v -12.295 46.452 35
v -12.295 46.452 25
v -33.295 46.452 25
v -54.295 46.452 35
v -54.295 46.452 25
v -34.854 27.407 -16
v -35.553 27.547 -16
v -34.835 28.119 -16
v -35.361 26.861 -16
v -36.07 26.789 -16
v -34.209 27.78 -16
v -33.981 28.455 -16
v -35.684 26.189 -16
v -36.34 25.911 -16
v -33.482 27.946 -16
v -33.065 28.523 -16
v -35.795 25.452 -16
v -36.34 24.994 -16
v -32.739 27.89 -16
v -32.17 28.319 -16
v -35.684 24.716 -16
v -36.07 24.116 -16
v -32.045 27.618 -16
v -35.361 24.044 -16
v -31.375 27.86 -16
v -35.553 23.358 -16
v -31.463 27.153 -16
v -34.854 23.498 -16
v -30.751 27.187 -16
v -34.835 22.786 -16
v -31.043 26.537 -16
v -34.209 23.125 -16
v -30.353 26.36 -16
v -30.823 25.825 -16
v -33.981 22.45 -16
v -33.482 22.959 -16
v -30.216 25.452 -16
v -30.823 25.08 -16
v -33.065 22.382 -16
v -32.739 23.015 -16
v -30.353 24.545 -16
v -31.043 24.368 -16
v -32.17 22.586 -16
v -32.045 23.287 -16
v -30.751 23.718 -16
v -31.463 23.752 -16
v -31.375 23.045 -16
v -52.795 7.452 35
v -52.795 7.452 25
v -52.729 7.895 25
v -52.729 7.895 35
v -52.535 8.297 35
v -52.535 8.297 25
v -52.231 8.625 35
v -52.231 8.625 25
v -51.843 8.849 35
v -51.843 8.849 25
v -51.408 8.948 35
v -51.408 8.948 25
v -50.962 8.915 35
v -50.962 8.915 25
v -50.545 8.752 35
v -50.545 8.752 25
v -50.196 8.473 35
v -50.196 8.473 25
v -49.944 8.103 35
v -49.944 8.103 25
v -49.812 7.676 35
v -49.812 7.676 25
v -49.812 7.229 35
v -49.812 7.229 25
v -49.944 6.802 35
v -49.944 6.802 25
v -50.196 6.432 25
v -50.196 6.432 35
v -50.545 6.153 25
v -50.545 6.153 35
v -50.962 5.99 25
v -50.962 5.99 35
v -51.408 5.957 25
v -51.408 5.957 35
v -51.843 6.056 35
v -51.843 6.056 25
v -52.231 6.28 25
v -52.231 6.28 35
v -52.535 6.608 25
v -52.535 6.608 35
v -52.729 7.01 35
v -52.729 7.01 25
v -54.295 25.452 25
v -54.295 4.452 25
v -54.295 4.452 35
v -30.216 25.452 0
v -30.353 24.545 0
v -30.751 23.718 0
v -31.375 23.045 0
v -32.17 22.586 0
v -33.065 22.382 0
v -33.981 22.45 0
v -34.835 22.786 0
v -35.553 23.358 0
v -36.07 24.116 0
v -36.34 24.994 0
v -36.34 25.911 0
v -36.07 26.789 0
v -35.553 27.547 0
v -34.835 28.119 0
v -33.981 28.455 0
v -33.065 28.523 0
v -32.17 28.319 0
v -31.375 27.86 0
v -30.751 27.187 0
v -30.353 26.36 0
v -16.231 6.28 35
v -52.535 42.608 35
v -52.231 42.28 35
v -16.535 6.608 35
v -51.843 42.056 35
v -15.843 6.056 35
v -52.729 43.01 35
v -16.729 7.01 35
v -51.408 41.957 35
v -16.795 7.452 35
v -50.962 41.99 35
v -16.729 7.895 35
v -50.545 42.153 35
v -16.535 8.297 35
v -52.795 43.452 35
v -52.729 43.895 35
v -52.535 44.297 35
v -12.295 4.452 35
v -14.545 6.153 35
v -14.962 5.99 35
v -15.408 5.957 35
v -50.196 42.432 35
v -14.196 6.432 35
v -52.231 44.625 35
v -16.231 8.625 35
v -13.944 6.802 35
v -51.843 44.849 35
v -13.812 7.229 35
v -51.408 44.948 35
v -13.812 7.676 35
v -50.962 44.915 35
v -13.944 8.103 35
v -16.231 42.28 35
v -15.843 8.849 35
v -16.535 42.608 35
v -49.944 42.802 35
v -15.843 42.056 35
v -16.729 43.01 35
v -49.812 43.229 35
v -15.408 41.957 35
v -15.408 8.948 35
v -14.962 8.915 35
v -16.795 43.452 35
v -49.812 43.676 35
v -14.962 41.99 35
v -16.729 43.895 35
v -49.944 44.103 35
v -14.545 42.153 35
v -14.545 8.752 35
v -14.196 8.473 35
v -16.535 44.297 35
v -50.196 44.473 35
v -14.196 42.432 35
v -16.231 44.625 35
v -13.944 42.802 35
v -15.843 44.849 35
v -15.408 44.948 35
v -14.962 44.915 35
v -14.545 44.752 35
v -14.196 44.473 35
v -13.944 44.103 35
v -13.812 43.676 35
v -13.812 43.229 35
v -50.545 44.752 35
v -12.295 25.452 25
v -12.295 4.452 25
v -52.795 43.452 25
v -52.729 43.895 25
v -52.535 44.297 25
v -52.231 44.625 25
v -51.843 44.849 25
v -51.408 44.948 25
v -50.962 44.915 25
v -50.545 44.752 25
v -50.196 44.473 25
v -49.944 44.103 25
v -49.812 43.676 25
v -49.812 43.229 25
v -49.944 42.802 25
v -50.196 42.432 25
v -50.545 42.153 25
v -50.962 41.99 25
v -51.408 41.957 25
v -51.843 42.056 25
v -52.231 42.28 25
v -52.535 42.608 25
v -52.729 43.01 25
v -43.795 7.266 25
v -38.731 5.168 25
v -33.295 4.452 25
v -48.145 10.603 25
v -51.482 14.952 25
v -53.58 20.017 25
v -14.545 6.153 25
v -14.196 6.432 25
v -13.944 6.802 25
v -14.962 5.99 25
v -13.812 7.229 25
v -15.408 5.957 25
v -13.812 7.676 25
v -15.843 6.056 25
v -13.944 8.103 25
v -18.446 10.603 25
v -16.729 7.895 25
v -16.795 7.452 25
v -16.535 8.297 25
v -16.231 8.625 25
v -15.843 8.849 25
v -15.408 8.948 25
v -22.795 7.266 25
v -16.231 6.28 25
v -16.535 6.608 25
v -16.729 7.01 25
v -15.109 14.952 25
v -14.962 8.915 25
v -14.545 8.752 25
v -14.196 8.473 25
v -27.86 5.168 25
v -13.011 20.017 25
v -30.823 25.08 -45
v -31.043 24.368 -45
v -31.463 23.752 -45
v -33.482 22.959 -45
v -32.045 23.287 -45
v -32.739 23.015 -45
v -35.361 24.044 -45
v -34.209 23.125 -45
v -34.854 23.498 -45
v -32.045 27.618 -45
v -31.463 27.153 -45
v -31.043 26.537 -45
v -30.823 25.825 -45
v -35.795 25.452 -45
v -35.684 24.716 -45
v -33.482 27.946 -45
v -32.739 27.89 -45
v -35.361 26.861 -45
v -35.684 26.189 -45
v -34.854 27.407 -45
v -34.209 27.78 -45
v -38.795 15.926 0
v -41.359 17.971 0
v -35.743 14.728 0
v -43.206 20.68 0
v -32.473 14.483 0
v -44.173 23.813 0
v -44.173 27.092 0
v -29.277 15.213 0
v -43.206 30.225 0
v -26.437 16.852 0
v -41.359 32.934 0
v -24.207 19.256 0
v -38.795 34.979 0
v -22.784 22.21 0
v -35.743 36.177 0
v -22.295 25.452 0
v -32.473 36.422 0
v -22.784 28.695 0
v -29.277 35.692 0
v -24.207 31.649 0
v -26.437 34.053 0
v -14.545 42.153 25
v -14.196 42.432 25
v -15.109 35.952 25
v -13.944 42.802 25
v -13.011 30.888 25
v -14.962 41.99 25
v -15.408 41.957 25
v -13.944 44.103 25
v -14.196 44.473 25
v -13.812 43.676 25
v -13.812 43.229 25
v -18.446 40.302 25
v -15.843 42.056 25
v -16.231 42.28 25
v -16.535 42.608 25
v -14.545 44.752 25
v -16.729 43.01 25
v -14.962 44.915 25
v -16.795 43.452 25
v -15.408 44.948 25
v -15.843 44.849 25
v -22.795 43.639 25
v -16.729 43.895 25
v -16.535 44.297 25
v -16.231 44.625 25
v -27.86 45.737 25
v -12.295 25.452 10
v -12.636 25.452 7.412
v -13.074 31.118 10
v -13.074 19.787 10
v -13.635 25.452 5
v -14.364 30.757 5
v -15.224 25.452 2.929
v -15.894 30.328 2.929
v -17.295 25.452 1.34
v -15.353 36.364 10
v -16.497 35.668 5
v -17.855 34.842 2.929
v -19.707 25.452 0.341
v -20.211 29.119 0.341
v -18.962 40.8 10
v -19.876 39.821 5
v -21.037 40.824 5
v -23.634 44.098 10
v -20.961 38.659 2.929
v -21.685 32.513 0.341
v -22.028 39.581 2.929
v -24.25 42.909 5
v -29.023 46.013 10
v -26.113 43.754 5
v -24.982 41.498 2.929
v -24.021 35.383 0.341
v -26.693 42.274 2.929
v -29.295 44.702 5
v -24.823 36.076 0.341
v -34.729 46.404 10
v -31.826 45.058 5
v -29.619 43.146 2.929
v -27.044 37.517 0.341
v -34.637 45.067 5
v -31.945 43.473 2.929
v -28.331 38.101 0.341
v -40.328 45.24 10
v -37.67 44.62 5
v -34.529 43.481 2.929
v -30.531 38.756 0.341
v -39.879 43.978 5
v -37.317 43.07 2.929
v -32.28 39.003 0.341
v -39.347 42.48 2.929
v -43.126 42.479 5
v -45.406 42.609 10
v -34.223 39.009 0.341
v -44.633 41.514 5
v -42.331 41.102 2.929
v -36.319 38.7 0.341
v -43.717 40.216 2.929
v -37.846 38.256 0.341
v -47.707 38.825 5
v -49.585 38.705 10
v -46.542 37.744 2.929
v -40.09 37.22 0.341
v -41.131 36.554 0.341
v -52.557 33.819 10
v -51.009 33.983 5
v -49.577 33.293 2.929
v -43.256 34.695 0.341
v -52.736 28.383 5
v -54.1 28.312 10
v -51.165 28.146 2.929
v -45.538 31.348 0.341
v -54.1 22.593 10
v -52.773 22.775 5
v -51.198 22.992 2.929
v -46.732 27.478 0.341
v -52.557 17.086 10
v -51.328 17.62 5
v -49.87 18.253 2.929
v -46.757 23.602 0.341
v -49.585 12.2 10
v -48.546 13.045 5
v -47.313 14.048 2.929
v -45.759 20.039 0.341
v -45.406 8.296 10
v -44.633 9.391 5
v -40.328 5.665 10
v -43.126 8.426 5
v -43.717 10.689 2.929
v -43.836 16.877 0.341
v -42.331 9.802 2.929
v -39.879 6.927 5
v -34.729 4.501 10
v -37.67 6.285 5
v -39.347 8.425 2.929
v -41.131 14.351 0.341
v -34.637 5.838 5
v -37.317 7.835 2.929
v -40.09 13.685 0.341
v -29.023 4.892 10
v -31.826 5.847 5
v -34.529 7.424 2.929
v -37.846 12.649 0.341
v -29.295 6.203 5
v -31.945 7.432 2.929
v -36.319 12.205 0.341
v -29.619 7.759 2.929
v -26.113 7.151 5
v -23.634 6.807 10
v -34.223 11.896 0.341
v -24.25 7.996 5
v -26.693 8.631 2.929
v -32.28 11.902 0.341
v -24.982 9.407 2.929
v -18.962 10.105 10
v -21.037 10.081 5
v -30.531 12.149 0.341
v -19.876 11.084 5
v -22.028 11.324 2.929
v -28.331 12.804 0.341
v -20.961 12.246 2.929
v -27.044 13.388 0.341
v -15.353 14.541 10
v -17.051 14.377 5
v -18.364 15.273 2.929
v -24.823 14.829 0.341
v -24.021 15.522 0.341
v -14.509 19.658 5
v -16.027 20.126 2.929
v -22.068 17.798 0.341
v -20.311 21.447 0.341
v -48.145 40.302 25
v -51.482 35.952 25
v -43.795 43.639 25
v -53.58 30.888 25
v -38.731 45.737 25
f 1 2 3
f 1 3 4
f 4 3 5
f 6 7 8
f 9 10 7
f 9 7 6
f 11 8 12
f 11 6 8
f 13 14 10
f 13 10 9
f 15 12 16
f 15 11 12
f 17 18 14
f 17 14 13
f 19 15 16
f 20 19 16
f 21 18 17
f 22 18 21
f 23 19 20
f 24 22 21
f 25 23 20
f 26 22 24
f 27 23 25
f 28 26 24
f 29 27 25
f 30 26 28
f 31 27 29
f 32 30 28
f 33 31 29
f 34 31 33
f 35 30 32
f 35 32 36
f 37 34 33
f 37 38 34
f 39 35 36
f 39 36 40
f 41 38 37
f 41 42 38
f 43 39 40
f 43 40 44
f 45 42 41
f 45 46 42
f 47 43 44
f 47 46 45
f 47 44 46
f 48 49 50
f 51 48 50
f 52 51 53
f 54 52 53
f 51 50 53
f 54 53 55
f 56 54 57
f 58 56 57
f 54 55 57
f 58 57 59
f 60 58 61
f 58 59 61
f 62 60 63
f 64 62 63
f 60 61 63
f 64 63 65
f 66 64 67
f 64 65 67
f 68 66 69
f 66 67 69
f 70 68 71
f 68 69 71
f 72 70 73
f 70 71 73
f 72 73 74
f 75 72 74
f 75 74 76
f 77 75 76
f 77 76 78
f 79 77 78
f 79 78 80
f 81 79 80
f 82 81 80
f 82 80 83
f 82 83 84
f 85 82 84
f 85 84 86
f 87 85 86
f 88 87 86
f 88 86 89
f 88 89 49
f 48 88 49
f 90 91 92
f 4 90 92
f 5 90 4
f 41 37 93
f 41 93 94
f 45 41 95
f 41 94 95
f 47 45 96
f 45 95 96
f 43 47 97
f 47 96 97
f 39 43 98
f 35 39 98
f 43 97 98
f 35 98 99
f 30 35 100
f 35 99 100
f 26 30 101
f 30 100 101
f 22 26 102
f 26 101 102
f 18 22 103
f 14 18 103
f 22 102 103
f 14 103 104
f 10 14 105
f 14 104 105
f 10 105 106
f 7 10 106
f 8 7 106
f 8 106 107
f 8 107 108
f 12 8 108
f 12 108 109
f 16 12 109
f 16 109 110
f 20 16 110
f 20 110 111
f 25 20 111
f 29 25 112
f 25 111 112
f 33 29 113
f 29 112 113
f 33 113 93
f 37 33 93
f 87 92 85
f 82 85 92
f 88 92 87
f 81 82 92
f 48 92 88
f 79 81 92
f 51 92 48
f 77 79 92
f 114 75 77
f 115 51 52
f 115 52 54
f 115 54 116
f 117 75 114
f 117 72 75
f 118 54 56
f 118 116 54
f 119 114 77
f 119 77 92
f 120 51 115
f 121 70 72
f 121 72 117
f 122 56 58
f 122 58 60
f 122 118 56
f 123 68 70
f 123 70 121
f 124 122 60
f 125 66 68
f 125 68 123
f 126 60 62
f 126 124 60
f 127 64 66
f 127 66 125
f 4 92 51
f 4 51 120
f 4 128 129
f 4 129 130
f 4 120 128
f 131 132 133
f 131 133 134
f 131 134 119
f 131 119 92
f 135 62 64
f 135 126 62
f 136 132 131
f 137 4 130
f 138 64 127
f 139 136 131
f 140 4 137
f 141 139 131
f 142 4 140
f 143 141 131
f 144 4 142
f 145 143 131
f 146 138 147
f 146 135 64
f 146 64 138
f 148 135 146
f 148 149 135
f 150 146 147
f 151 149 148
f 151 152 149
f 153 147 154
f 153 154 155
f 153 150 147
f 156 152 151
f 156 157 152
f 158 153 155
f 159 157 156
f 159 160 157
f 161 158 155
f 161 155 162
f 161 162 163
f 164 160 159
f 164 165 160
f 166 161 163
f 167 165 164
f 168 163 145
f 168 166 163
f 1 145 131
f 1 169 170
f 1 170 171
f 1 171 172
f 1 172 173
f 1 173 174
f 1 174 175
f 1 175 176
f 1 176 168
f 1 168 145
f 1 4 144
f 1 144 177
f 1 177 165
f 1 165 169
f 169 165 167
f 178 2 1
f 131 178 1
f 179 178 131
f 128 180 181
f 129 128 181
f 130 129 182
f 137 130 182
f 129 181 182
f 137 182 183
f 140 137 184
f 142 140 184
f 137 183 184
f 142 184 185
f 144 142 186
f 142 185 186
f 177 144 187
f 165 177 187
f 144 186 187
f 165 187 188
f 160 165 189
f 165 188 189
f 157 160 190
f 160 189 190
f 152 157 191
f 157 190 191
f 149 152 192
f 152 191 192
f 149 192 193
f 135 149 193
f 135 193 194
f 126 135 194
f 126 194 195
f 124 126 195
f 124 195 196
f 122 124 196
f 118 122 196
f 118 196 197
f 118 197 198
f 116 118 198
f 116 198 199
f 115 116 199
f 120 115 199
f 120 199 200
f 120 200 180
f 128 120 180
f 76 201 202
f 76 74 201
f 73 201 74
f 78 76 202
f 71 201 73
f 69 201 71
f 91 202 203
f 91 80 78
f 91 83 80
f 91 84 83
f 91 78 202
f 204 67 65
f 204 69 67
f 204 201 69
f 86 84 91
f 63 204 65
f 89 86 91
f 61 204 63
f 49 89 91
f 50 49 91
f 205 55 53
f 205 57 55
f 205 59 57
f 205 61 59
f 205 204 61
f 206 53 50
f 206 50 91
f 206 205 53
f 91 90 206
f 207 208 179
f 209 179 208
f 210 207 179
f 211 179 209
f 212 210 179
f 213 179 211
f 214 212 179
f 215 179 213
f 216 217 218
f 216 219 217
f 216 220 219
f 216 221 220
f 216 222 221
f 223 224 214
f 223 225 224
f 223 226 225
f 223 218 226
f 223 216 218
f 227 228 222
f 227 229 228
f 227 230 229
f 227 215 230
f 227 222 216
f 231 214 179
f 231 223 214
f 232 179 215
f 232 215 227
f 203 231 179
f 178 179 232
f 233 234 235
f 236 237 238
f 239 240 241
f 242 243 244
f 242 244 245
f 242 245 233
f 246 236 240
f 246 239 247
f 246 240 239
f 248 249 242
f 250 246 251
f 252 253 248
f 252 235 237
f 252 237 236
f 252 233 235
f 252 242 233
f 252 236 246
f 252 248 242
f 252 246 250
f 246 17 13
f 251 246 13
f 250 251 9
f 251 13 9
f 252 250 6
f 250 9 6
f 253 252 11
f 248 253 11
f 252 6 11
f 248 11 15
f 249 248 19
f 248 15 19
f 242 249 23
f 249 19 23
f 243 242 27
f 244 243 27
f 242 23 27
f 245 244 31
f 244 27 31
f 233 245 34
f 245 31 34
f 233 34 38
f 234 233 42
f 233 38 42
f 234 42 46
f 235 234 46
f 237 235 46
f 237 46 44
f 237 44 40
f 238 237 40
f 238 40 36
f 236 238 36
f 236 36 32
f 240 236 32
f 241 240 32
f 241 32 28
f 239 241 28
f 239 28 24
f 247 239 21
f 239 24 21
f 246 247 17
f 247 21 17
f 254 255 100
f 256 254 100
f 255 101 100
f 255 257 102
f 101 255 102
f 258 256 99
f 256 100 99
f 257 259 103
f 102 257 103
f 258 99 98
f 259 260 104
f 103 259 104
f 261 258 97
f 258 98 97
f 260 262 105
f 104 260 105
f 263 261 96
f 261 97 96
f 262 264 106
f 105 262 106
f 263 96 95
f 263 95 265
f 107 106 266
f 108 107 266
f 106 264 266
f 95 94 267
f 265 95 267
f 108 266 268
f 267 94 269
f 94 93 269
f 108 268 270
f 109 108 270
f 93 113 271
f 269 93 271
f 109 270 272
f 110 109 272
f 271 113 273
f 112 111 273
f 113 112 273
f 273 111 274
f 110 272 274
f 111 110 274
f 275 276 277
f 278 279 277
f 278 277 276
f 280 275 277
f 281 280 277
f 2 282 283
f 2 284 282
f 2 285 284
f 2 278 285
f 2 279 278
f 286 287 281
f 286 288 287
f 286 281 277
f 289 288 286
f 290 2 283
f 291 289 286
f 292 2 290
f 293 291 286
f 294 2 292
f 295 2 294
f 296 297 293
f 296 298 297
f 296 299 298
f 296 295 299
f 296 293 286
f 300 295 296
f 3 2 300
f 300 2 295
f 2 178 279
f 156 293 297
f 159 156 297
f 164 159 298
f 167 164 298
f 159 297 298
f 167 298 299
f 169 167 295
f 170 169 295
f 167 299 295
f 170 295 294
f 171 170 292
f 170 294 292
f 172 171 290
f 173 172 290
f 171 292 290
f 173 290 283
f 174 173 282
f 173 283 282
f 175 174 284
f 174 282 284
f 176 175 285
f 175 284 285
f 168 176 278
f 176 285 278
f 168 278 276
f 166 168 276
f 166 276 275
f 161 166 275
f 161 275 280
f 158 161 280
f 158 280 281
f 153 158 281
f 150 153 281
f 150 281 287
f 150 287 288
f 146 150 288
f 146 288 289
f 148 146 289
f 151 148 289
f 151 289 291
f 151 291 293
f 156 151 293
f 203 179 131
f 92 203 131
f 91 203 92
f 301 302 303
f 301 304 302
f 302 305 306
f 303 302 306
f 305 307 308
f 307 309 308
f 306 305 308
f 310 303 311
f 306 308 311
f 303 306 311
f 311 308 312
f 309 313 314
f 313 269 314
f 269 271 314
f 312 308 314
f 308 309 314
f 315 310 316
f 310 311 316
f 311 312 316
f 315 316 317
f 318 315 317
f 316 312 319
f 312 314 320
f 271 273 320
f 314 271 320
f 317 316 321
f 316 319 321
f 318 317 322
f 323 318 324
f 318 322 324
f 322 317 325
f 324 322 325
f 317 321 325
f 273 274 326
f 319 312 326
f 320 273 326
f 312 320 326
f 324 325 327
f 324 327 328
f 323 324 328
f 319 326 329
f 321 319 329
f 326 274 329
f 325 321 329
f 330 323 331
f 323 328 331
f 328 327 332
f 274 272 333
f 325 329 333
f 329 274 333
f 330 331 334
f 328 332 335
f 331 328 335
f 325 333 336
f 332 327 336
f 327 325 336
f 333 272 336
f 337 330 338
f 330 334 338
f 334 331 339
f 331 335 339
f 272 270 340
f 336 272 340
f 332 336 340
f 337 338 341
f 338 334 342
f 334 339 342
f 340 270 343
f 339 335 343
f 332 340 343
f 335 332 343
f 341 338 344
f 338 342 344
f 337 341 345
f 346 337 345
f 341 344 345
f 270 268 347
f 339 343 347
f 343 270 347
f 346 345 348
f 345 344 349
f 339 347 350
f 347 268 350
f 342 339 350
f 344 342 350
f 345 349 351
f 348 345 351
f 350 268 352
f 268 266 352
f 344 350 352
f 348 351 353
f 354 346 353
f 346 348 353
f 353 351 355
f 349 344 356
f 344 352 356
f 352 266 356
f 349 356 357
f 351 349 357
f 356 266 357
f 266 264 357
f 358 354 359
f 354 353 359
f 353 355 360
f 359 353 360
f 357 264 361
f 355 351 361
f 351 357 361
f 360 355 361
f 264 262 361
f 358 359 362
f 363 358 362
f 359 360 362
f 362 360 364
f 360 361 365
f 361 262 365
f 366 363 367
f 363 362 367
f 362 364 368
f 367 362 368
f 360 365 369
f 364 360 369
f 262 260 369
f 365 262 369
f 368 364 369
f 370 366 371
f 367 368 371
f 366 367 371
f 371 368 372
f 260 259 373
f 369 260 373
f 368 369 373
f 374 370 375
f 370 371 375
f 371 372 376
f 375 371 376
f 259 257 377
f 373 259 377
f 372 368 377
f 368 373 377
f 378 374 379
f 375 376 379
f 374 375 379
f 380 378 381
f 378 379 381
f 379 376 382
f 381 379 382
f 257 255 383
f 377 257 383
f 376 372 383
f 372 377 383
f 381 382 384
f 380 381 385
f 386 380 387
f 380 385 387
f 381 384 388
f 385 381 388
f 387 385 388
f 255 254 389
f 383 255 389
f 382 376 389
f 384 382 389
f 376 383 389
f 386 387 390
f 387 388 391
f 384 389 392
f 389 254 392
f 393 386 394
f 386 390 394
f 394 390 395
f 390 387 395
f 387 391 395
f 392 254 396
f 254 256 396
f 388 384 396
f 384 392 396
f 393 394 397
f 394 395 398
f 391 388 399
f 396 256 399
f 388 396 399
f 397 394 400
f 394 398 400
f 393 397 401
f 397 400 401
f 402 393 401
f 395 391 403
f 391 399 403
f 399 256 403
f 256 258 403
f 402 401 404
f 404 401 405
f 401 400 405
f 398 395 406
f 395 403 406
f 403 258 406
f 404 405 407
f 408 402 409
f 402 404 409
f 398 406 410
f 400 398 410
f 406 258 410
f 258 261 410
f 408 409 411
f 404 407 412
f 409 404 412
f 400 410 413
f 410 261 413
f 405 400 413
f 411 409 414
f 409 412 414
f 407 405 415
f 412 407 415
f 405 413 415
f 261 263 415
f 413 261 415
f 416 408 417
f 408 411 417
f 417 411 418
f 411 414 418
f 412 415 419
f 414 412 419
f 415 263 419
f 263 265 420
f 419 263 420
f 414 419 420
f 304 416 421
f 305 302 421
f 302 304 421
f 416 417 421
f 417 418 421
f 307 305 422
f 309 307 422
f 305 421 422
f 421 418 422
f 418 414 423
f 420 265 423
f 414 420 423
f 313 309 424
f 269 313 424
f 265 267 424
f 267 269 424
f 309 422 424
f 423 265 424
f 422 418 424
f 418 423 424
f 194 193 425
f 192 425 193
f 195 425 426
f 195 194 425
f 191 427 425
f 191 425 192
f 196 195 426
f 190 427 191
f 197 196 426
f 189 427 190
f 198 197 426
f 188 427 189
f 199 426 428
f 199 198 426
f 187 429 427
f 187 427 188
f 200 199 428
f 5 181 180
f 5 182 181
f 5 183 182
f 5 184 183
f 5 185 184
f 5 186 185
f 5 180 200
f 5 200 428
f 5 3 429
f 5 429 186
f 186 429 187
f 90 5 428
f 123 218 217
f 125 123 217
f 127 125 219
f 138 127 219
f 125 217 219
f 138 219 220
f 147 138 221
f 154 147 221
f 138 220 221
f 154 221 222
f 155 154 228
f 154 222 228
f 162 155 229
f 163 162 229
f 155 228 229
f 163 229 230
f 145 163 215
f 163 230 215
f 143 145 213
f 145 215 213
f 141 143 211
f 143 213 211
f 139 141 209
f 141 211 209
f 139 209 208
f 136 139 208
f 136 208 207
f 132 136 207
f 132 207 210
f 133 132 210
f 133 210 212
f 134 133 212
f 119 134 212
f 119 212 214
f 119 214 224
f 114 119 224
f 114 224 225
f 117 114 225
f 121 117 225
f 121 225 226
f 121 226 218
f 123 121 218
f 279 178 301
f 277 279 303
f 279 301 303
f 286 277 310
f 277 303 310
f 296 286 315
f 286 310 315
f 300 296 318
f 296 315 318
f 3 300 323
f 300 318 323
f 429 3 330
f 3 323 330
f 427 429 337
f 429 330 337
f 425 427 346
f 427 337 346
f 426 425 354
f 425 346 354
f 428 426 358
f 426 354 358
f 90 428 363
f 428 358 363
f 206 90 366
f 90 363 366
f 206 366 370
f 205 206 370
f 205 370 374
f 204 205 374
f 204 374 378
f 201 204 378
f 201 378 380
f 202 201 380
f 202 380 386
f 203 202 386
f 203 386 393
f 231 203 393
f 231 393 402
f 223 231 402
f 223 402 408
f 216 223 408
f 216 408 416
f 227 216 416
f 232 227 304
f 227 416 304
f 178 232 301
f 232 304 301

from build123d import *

# Parameters (mm, degrees)
ESBO_O1_R                = 21
RESSALTO_EXTRUS_O1_DEPTH = 46
FILETE1_R                = 10
ESBO_O2_R                = 3.079372868
RESSALTO_EXTRUS_O2_DEPTH = 16
ESBO_O3_R                = 2.5
RESSALTO_EXTRUS_O3_DEPTH = 29
RESSALTO_EXTRUS_O4_DEPTH = 10
ESBO_O5_R                = 21
CORTE_EXTRUS_O2_DEPTH    = 101.029128289
ESBO_O6_R                = 21
RESSALTO_EXTRUS_O5_DEPTH = 10
ESBO_O7_R                = 1.5
CORTE_EXTRUS_O3_DEPTH    = 101.029128289


with BuildPart() as part:
    # Esboço1 → Ressalto-extrusão1 (new body)
    with BuildSketch(Plane.XY):
        with Locations((-33.295415682, 25.452495544)):
            Circle(ESBO_O1_R)
    extrude(amount=RESSALTO_EXTRUS_O1_DEPTH)

    # Filete1
    filete1_edges = [part.edges().sort_by_distance(p)[0] for p in [
        (-54.295415682, 25.452495544, 0),
        (-54.295415682, 25.452495544, 46),
    ]]
    fillet(filete1_edges, radius=FILETE1_R)

    # Esboço2 → Ressalto-extrusão2 (add)
    with BuildSketch(Plane(origin=(0, 0, 0), x_dir=(-1, 0, 0), z_dir=(0, 0, -1))):
        with Locations(Location((33.295415682, 25.452495544, 0), (0, 0, 180))):
            Circle(ESBO_O2_R)
    extrude(amount=RESSALTO_EXTRUS_O2_DEPTH)

    # Esboço3 → Ressalto-extrusão3 (add)
    with BuildSketch(Plane(origin=(0, 0, -16), x_dir=(-1, 0, 0), z_dir=(0, 0, -1))):
        with Locations((33.295415682, 25.452495544)):
            Circle(ESBO_O3_R)
    extrude(amount=RESSALTO_EXTRUS_O3_DEPTH)

    # Esboço4 → Ressalto-extrusão4 (add)
    with BuildSketch(Plane.XY.offset(25)):
        Polygon((-33.295415682, 46.452495544), (-12.295415682, 46.452495544), (-12.295415682, 4.452495544), (-54.295415682, 4.452495544), (-54.295415682, 46.452495544), align=None)
    extrude(amount=RESSALTO_EXTRUS_O4_DEPTH)

    # Esboço5 → Corte-extrusão2 (cut, through all)
    with BuildSketch(Plane.XY.offset(25)):
        with Locations(Location((-33.295415682, 25.452495544, 0), (0, 0, 180))):
            Circle(ESBO_O5_R)
    extrude(amount=CORTE_EXTRUS_O2_DEPTH, mode=Mode.SUBTRACT)


with BuildPart() as corte_extrus_o2_piece_1:
    # of the separate pieces the step leaves, piece 1, a body of its own (corte_extrus_o2_pieces)
    add(part.part.solids().sort_by_distance((-12.295415682, 25.452495544, 10))[0])



with BuildPart() as corte_extrus_o2_piece_2:
    # of the separate pieces the step leaves, piece 2, a body of its own (corte_extrus_o2_pieces)
    add(part.part.solids().sort_by_distance((-54.295415682, 46.452495544, 25))[0])


with BuildPart() as corte_extrus_o2_piece_3:
    # of the separate pieces the step leaves, piece 3, a body of its own (corte_extrus_o2_pieces)
    add(part.part.solids().sort_by_distance((-54.295415682, 4.452495544, 25))[0])


with BuildPart() as corte_extrus_o2_piece_4:
    # of the separate pieces the step leaves, piece 4, a body of its own (corte_extrus_o2_pieces)
    add(part.part.solids().sort_by_distance((-12.295415682, 46.452495544, 25))[0])


with BuildPart() as corte_extrus_o2_piece_5:
    # of the separate pieces the step leaves, piece 5, a body of its own (corte_extrus_o2_pieces)
    add(part.part.solids().sort_by_distance((-12.295415682, 4.452495544, 25))[0])


with BuildPart() as corte_extrus_o2_piece_1_1:
    add(corte_extrus_o2_piece_1.part)

    add(corte_extrus_o2_piece_2.part)  # Ressalto-extrusão5 merges Corte-extrusão2 piece 2

    add(corte_extrus_o2_piece_3.part)  # Ressalto-extrusão5 merges Corte-extrusão2 piece 3

    add(corte_extrus_o2_piece_4.part)  # Ressalto-extrusão5 merges Corte-extrusão2 piece 4

    add(corte_extrus_o2_piece_5.part)  # Ressalto-extrusão5 merges Corte-extrusão2 piece 5
    # Esboço6 → Ressalto-extrusão5 (add)
    with BuildSketch(Plane.XY.offset(25)):
        with Locations((-33.295415682, 25.452495544)):
            Circle(ESBO_O6_R)
    extrude(amount=RESSALTO_EXTRUS_O5_DEPTH)

    # Esboço7 → Corte-extrusão3 (cut, through all)
    with BuildSketch(Plane(origin=(0, 0, 25), x_dir=(-1, 0, 0), z_dir=(0, 0, -1))):
        with Locations((15.295415682, 43.452495544)):
            Circle(ESBO_O7_R)
        with Locations((51.295415682, 43.452495544)):
            Circle(ESBO_O7_R)
        with Locations((51.295415682, 7.452495544)):
            Circle(ESBO_O7_R)
        with Locations((15.295415682, 7.452495544)):
            Circle(ESBO_O7_R)
    extrude(amount=-CORTE_EXTRUS_O3_DEPTH, mode=Mode.SUBTRACT)


solid = corte_extrus_o2_piece_1_1.part
